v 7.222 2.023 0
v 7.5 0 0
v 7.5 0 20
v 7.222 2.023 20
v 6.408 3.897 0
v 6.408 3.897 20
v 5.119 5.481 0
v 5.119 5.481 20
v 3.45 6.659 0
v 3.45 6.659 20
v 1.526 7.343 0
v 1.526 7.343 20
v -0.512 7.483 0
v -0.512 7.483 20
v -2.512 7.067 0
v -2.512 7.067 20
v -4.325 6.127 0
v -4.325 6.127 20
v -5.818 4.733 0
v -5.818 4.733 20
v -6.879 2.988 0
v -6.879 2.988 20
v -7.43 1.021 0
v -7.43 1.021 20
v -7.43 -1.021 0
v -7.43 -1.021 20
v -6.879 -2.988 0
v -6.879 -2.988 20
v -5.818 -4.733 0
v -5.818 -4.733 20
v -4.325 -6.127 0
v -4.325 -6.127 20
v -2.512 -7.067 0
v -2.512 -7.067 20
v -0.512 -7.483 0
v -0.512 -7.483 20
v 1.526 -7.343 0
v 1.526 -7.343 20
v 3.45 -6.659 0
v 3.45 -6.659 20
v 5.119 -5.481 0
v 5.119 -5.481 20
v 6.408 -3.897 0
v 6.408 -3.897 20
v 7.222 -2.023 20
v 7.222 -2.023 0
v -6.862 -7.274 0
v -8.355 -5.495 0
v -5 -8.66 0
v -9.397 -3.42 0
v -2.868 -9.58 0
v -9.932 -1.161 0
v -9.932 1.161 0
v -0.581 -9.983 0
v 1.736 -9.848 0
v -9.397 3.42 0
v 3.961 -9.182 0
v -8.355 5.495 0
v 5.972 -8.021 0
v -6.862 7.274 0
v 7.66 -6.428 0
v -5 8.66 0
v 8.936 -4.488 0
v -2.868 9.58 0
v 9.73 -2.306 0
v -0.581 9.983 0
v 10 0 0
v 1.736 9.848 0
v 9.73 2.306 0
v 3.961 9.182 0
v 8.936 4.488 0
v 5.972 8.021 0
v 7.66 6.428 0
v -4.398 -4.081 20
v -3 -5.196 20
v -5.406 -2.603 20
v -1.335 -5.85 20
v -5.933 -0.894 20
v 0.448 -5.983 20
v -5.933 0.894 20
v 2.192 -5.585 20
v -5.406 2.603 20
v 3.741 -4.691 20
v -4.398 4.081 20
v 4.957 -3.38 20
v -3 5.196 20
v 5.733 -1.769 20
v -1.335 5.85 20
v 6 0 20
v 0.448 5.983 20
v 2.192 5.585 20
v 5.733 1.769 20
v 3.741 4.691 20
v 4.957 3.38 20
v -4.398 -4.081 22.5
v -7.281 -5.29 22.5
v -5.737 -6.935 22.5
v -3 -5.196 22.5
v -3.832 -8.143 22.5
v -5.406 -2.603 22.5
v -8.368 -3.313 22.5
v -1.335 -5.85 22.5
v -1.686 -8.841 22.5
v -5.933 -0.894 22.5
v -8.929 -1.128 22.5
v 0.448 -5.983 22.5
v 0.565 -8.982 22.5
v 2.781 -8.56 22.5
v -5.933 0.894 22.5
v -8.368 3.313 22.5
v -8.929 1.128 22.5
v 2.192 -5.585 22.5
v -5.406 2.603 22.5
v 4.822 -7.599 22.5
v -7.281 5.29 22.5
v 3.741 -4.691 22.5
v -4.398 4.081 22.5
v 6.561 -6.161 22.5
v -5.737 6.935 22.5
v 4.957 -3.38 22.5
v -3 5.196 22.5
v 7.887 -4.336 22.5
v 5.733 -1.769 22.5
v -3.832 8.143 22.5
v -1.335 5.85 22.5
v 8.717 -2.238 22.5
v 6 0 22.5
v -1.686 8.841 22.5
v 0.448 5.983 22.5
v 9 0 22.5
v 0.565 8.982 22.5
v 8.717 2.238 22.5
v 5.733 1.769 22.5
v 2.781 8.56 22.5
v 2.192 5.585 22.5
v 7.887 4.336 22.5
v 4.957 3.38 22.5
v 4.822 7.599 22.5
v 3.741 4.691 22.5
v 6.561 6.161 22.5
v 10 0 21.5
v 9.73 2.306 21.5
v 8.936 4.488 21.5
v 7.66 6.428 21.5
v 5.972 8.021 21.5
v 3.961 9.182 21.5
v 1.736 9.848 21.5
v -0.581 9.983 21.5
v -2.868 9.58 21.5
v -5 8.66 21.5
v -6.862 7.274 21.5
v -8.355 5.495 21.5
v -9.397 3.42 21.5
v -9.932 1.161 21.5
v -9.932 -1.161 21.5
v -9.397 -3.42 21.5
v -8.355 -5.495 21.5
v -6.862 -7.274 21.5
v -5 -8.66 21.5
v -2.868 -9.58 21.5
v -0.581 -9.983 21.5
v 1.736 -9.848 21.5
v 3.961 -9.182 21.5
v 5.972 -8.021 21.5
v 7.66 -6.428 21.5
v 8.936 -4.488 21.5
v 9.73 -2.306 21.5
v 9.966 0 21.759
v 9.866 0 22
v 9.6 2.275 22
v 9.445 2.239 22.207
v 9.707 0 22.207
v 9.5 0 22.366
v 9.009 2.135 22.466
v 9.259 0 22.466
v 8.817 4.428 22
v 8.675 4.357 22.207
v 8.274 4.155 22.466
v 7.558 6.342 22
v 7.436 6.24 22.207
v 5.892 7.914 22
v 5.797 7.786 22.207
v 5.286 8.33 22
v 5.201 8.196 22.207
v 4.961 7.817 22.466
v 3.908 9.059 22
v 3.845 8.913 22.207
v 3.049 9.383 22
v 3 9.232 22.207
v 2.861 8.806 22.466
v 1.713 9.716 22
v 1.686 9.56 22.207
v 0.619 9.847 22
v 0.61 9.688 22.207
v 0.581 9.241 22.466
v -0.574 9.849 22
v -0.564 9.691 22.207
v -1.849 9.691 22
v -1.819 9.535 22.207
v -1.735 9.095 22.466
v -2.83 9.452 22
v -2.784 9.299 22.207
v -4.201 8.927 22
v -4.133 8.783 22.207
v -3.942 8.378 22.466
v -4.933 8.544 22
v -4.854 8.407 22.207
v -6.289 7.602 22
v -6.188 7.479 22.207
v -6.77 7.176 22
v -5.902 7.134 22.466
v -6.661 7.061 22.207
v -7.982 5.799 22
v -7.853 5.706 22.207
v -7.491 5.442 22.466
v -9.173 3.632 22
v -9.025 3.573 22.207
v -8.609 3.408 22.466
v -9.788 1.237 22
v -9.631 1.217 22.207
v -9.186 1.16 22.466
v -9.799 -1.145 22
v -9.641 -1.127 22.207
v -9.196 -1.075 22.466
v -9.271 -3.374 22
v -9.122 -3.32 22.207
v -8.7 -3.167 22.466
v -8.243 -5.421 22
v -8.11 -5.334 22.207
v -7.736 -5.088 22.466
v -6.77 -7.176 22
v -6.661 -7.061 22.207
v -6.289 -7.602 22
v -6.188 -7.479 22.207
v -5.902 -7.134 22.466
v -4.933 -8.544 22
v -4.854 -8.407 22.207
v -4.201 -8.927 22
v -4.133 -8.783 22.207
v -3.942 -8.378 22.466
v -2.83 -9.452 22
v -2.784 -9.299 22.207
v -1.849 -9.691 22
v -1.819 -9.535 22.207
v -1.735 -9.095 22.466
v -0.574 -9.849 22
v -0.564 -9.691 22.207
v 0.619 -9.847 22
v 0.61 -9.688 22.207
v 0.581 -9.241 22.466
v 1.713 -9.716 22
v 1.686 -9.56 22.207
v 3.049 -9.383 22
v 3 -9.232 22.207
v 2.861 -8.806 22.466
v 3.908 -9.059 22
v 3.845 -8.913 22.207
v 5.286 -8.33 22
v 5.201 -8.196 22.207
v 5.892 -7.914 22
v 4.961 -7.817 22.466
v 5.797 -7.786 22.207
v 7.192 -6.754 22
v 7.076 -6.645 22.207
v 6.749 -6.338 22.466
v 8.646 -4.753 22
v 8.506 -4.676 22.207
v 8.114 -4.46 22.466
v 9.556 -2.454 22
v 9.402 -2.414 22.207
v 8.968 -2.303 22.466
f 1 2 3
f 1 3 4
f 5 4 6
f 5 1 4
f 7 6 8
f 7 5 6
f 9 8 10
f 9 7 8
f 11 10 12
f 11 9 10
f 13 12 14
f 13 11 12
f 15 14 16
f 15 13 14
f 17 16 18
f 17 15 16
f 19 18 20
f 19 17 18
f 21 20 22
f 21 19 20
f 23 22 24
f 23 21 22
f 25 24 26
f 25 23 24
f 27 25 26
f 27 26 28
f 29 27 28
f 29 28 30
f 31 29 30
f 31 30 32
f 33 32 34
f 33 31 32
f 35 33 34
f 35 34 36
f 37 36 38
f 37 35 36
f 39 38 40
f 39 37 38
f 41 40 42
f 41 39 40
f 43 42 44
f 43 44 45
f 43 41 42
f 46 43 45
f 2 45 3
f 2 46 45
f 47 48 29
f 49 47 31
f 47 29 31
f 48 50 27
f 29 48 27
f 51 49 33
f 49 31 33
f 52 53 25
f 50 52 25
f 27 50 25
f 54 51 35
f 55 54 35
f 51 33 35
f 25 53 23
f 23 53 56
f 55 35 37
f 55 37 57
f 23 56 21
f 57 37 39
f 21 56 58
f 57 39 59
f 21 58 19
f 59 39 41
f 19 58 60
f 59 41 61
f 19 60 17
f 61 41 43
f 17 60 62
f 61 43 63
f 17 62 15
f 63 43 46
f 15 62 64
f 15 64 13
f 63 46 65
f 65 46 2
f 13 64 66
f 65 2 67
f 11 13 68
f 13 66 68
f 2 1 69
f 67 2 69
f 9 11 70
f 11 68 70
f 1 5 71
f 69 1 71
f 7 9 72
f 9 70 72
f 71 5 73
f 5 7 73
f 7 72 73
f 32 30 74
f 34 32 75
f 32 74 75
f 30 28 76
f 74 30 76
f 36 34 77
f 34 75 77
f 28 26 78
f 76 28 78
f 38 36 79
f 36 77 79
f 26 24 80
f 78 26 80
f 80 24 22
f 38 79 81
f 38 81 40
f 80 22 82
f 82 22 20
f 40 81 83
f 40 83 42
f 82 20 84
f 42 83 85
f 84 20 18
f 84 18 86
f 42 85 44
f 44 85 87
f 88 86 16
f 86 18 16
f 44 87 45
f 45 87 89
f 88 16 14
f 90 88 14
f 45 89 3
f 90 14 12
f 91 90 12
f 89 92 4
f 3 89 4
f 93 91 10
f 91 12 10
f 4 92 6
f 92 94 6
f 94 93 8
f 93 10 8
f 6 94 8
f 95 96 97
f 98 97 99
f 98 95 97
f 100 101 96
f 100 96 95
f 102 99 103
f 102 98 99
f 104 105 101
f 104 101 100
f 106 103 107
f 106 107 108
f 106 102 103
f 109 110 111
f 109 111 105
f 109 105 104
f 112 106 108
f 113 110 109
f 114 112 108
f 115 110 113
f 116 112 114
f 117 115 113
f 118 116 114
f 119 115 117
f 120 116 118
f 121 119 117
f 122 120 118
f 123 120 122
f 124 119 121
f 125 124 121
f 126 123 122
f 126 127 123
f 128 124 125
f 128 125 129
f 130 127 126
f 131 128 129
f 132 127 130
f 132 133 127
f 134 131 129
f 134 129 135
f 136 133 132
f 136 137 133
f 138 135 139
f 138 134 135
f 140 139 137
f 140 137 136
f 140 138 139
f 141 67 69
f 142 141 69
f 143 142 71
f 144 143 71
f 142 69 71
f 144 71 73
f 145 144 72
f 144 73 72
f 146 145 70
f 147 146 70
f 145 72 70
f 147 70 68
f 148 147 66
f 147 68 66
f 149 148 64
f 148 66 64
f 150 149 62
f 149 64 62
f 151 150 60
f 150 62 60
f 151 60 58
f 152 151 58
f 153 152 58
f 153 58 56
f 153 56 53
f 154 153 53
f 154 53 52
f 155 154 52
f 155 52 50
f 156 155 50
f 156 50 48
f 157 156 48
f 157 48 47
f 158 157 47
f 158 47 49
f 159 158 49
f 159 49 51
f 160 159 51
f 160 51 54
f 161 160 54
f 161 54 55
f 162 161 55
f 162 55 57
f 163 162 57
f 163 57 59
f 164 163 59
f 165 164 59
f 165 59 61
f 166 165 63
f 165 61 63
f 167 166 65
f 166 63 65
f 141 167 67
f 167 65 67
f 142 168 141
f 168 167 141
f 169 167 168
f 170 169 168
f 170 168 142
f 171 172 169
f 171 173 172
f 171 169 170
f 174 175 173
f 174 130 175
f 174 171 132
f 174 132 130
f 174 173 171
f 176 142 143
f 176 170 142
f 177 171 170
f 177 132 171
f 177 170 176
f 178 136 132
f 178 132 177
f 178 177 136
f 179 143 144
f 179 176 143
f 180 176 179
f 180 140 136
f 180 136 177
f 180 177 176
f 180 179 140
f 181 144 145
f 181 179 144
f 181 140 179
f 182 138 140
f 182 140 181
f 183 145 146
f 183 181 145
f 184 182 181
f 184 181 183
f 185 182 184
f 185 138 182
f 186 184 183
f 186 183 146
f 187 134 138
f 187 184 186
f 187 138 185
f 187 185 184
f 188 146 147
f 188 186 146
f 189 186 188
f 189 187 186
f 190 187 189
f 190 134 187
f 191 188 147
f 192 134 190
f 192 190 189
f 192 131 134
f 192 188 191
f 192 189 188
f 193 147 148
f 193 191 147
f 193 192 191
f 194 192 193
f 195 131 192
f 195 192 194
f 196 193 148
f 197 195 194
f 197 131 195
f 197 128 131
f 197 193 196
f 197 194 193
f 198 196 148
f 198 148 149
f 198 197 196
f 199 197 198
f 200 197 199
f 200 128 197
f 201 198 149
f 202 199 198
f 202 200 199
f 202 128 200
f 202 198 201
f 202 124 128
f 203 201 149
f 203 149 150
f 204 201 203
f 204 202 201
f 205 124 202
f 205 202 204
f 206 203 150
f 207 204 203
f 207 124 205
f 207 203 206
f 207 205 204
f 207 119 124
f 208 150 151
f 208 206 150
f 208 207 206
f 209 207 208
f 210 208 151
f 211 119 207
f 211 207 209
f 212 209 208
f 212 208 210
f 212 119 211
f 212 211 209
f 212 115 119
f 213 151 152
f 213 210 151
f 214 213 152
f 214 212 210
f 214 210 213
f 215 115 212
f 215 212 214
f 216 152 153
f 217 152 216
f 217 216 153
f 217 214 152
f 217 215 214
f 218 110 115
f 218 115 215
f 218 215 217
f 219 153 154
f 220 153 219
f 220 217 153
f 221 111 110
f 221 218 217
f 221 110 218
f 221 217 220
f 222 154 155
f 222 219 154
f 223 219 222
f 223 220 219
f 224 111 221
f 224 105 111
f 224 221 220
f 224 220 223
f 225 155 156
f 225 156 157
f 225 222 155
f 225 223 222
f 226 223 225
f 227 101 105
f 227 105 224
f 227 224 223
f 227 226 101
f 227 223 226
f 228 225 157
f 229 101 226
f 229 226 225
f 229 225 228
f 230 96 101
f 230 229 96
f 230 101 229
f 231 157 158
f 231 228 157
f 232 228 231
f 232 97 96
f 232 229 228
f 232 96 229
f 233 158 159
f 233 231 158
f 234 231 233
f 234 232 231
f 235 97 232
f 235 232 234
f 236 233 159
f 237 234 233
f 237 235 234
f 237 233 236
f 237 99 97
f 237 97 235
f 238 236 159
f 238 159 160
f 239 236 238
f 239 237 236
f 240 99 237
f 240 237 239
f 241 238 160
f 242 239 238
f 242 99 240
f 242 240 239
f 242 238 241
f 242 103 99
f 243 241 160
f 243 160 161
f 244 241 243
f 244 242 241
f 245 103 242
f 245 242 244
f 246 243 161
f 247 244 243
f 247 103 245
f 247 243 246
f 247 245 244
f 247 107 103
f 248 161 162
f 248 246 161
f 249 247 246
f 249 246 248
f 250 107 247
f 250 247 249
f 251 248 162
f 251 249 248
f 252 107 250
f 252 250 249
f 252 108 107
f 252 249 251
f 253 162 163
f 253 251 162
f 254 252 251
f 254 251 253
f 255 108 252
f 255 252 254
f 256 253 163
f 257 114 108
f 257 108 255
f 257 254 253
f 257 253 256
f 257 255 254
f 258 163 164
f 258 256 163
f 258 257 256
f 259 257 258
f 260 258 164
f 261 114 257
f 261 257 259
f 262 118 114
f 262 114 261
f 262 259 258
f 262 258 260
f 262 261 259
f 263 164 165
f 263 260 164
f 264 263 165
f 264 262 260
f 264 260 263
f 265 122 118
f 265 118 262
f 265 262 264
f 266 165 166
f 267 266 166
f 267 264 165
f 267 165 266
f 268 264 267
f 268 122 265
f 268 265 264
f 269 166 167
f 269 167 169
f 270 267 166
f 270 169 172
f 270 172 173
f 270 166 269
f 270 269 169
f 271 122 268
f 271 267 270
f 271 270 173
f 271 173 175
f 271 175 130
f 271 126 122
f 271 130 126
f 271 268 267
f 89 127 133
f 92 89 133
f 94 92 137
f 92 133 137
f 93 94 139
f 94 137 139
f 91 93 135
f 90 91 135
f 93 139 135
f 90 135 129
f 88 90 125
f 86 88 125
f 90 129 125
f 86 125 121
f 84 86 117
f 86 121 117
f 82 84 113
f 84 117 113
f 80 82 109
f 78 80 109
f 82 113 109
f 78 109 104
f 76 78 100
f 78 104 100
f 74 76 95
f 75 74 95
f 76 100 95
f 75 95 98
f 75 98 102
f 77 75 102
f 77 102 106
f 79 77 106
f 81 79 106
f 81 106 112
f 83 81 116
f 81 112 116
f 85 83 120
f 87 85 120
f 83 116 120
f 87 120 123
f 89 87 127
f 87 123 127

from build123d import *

# Parameters (mm, degrees)
SKETCH1_R           = 10
SKETCH1_R_2         = 7.5
BOSS_EXTRUDE1_DEPTH = 20
SKETCH2_R           = 10
BOSS_EXTRUDE2_DEPTH = 2.5
SKETCH3_R           = 6
CUT_EXTRUDE1_DEPTH  = 2.5
FILLET1_R           = 1


with BuildPart() as part:
    # Sketch1 → Boss-Extrude1 (new body)
    with BuildSketch(Plane.XY):
        Circle(SKETCH1_R)
        Circle(SKETCH1_R_2, mode=Mode.SUBTRACT)
    extrude(amount=BOSS_EXTRUDE1_DEPTH)

    # Sketch2 → Boss-Extrude2 (add)
    with BuildSketch(Plane.XY.offset(20)):
        Circle(SKETCH2_R)
    extrude(amount=BOSS_EXTRUDE2_DEPTH)

    # Sketch3 → Cut-Extrude1 (cut)
    with BuildSketch(Plane.XY.offset(22.5)):
        Circle(SKETCH3_R)
    extrude(amount=-CUT_EXTRUDE1_DEPTH, mode=Mode.SUBTRACT)

    # Fillet1
    fillet1_edges = [part.edges().sort_by_distance(p)[0] for p in [
        (-10, 0, 22.5),
    ]]
    fillet(fillet1_edges, radius=FILLET1_R)


solid = part.part
